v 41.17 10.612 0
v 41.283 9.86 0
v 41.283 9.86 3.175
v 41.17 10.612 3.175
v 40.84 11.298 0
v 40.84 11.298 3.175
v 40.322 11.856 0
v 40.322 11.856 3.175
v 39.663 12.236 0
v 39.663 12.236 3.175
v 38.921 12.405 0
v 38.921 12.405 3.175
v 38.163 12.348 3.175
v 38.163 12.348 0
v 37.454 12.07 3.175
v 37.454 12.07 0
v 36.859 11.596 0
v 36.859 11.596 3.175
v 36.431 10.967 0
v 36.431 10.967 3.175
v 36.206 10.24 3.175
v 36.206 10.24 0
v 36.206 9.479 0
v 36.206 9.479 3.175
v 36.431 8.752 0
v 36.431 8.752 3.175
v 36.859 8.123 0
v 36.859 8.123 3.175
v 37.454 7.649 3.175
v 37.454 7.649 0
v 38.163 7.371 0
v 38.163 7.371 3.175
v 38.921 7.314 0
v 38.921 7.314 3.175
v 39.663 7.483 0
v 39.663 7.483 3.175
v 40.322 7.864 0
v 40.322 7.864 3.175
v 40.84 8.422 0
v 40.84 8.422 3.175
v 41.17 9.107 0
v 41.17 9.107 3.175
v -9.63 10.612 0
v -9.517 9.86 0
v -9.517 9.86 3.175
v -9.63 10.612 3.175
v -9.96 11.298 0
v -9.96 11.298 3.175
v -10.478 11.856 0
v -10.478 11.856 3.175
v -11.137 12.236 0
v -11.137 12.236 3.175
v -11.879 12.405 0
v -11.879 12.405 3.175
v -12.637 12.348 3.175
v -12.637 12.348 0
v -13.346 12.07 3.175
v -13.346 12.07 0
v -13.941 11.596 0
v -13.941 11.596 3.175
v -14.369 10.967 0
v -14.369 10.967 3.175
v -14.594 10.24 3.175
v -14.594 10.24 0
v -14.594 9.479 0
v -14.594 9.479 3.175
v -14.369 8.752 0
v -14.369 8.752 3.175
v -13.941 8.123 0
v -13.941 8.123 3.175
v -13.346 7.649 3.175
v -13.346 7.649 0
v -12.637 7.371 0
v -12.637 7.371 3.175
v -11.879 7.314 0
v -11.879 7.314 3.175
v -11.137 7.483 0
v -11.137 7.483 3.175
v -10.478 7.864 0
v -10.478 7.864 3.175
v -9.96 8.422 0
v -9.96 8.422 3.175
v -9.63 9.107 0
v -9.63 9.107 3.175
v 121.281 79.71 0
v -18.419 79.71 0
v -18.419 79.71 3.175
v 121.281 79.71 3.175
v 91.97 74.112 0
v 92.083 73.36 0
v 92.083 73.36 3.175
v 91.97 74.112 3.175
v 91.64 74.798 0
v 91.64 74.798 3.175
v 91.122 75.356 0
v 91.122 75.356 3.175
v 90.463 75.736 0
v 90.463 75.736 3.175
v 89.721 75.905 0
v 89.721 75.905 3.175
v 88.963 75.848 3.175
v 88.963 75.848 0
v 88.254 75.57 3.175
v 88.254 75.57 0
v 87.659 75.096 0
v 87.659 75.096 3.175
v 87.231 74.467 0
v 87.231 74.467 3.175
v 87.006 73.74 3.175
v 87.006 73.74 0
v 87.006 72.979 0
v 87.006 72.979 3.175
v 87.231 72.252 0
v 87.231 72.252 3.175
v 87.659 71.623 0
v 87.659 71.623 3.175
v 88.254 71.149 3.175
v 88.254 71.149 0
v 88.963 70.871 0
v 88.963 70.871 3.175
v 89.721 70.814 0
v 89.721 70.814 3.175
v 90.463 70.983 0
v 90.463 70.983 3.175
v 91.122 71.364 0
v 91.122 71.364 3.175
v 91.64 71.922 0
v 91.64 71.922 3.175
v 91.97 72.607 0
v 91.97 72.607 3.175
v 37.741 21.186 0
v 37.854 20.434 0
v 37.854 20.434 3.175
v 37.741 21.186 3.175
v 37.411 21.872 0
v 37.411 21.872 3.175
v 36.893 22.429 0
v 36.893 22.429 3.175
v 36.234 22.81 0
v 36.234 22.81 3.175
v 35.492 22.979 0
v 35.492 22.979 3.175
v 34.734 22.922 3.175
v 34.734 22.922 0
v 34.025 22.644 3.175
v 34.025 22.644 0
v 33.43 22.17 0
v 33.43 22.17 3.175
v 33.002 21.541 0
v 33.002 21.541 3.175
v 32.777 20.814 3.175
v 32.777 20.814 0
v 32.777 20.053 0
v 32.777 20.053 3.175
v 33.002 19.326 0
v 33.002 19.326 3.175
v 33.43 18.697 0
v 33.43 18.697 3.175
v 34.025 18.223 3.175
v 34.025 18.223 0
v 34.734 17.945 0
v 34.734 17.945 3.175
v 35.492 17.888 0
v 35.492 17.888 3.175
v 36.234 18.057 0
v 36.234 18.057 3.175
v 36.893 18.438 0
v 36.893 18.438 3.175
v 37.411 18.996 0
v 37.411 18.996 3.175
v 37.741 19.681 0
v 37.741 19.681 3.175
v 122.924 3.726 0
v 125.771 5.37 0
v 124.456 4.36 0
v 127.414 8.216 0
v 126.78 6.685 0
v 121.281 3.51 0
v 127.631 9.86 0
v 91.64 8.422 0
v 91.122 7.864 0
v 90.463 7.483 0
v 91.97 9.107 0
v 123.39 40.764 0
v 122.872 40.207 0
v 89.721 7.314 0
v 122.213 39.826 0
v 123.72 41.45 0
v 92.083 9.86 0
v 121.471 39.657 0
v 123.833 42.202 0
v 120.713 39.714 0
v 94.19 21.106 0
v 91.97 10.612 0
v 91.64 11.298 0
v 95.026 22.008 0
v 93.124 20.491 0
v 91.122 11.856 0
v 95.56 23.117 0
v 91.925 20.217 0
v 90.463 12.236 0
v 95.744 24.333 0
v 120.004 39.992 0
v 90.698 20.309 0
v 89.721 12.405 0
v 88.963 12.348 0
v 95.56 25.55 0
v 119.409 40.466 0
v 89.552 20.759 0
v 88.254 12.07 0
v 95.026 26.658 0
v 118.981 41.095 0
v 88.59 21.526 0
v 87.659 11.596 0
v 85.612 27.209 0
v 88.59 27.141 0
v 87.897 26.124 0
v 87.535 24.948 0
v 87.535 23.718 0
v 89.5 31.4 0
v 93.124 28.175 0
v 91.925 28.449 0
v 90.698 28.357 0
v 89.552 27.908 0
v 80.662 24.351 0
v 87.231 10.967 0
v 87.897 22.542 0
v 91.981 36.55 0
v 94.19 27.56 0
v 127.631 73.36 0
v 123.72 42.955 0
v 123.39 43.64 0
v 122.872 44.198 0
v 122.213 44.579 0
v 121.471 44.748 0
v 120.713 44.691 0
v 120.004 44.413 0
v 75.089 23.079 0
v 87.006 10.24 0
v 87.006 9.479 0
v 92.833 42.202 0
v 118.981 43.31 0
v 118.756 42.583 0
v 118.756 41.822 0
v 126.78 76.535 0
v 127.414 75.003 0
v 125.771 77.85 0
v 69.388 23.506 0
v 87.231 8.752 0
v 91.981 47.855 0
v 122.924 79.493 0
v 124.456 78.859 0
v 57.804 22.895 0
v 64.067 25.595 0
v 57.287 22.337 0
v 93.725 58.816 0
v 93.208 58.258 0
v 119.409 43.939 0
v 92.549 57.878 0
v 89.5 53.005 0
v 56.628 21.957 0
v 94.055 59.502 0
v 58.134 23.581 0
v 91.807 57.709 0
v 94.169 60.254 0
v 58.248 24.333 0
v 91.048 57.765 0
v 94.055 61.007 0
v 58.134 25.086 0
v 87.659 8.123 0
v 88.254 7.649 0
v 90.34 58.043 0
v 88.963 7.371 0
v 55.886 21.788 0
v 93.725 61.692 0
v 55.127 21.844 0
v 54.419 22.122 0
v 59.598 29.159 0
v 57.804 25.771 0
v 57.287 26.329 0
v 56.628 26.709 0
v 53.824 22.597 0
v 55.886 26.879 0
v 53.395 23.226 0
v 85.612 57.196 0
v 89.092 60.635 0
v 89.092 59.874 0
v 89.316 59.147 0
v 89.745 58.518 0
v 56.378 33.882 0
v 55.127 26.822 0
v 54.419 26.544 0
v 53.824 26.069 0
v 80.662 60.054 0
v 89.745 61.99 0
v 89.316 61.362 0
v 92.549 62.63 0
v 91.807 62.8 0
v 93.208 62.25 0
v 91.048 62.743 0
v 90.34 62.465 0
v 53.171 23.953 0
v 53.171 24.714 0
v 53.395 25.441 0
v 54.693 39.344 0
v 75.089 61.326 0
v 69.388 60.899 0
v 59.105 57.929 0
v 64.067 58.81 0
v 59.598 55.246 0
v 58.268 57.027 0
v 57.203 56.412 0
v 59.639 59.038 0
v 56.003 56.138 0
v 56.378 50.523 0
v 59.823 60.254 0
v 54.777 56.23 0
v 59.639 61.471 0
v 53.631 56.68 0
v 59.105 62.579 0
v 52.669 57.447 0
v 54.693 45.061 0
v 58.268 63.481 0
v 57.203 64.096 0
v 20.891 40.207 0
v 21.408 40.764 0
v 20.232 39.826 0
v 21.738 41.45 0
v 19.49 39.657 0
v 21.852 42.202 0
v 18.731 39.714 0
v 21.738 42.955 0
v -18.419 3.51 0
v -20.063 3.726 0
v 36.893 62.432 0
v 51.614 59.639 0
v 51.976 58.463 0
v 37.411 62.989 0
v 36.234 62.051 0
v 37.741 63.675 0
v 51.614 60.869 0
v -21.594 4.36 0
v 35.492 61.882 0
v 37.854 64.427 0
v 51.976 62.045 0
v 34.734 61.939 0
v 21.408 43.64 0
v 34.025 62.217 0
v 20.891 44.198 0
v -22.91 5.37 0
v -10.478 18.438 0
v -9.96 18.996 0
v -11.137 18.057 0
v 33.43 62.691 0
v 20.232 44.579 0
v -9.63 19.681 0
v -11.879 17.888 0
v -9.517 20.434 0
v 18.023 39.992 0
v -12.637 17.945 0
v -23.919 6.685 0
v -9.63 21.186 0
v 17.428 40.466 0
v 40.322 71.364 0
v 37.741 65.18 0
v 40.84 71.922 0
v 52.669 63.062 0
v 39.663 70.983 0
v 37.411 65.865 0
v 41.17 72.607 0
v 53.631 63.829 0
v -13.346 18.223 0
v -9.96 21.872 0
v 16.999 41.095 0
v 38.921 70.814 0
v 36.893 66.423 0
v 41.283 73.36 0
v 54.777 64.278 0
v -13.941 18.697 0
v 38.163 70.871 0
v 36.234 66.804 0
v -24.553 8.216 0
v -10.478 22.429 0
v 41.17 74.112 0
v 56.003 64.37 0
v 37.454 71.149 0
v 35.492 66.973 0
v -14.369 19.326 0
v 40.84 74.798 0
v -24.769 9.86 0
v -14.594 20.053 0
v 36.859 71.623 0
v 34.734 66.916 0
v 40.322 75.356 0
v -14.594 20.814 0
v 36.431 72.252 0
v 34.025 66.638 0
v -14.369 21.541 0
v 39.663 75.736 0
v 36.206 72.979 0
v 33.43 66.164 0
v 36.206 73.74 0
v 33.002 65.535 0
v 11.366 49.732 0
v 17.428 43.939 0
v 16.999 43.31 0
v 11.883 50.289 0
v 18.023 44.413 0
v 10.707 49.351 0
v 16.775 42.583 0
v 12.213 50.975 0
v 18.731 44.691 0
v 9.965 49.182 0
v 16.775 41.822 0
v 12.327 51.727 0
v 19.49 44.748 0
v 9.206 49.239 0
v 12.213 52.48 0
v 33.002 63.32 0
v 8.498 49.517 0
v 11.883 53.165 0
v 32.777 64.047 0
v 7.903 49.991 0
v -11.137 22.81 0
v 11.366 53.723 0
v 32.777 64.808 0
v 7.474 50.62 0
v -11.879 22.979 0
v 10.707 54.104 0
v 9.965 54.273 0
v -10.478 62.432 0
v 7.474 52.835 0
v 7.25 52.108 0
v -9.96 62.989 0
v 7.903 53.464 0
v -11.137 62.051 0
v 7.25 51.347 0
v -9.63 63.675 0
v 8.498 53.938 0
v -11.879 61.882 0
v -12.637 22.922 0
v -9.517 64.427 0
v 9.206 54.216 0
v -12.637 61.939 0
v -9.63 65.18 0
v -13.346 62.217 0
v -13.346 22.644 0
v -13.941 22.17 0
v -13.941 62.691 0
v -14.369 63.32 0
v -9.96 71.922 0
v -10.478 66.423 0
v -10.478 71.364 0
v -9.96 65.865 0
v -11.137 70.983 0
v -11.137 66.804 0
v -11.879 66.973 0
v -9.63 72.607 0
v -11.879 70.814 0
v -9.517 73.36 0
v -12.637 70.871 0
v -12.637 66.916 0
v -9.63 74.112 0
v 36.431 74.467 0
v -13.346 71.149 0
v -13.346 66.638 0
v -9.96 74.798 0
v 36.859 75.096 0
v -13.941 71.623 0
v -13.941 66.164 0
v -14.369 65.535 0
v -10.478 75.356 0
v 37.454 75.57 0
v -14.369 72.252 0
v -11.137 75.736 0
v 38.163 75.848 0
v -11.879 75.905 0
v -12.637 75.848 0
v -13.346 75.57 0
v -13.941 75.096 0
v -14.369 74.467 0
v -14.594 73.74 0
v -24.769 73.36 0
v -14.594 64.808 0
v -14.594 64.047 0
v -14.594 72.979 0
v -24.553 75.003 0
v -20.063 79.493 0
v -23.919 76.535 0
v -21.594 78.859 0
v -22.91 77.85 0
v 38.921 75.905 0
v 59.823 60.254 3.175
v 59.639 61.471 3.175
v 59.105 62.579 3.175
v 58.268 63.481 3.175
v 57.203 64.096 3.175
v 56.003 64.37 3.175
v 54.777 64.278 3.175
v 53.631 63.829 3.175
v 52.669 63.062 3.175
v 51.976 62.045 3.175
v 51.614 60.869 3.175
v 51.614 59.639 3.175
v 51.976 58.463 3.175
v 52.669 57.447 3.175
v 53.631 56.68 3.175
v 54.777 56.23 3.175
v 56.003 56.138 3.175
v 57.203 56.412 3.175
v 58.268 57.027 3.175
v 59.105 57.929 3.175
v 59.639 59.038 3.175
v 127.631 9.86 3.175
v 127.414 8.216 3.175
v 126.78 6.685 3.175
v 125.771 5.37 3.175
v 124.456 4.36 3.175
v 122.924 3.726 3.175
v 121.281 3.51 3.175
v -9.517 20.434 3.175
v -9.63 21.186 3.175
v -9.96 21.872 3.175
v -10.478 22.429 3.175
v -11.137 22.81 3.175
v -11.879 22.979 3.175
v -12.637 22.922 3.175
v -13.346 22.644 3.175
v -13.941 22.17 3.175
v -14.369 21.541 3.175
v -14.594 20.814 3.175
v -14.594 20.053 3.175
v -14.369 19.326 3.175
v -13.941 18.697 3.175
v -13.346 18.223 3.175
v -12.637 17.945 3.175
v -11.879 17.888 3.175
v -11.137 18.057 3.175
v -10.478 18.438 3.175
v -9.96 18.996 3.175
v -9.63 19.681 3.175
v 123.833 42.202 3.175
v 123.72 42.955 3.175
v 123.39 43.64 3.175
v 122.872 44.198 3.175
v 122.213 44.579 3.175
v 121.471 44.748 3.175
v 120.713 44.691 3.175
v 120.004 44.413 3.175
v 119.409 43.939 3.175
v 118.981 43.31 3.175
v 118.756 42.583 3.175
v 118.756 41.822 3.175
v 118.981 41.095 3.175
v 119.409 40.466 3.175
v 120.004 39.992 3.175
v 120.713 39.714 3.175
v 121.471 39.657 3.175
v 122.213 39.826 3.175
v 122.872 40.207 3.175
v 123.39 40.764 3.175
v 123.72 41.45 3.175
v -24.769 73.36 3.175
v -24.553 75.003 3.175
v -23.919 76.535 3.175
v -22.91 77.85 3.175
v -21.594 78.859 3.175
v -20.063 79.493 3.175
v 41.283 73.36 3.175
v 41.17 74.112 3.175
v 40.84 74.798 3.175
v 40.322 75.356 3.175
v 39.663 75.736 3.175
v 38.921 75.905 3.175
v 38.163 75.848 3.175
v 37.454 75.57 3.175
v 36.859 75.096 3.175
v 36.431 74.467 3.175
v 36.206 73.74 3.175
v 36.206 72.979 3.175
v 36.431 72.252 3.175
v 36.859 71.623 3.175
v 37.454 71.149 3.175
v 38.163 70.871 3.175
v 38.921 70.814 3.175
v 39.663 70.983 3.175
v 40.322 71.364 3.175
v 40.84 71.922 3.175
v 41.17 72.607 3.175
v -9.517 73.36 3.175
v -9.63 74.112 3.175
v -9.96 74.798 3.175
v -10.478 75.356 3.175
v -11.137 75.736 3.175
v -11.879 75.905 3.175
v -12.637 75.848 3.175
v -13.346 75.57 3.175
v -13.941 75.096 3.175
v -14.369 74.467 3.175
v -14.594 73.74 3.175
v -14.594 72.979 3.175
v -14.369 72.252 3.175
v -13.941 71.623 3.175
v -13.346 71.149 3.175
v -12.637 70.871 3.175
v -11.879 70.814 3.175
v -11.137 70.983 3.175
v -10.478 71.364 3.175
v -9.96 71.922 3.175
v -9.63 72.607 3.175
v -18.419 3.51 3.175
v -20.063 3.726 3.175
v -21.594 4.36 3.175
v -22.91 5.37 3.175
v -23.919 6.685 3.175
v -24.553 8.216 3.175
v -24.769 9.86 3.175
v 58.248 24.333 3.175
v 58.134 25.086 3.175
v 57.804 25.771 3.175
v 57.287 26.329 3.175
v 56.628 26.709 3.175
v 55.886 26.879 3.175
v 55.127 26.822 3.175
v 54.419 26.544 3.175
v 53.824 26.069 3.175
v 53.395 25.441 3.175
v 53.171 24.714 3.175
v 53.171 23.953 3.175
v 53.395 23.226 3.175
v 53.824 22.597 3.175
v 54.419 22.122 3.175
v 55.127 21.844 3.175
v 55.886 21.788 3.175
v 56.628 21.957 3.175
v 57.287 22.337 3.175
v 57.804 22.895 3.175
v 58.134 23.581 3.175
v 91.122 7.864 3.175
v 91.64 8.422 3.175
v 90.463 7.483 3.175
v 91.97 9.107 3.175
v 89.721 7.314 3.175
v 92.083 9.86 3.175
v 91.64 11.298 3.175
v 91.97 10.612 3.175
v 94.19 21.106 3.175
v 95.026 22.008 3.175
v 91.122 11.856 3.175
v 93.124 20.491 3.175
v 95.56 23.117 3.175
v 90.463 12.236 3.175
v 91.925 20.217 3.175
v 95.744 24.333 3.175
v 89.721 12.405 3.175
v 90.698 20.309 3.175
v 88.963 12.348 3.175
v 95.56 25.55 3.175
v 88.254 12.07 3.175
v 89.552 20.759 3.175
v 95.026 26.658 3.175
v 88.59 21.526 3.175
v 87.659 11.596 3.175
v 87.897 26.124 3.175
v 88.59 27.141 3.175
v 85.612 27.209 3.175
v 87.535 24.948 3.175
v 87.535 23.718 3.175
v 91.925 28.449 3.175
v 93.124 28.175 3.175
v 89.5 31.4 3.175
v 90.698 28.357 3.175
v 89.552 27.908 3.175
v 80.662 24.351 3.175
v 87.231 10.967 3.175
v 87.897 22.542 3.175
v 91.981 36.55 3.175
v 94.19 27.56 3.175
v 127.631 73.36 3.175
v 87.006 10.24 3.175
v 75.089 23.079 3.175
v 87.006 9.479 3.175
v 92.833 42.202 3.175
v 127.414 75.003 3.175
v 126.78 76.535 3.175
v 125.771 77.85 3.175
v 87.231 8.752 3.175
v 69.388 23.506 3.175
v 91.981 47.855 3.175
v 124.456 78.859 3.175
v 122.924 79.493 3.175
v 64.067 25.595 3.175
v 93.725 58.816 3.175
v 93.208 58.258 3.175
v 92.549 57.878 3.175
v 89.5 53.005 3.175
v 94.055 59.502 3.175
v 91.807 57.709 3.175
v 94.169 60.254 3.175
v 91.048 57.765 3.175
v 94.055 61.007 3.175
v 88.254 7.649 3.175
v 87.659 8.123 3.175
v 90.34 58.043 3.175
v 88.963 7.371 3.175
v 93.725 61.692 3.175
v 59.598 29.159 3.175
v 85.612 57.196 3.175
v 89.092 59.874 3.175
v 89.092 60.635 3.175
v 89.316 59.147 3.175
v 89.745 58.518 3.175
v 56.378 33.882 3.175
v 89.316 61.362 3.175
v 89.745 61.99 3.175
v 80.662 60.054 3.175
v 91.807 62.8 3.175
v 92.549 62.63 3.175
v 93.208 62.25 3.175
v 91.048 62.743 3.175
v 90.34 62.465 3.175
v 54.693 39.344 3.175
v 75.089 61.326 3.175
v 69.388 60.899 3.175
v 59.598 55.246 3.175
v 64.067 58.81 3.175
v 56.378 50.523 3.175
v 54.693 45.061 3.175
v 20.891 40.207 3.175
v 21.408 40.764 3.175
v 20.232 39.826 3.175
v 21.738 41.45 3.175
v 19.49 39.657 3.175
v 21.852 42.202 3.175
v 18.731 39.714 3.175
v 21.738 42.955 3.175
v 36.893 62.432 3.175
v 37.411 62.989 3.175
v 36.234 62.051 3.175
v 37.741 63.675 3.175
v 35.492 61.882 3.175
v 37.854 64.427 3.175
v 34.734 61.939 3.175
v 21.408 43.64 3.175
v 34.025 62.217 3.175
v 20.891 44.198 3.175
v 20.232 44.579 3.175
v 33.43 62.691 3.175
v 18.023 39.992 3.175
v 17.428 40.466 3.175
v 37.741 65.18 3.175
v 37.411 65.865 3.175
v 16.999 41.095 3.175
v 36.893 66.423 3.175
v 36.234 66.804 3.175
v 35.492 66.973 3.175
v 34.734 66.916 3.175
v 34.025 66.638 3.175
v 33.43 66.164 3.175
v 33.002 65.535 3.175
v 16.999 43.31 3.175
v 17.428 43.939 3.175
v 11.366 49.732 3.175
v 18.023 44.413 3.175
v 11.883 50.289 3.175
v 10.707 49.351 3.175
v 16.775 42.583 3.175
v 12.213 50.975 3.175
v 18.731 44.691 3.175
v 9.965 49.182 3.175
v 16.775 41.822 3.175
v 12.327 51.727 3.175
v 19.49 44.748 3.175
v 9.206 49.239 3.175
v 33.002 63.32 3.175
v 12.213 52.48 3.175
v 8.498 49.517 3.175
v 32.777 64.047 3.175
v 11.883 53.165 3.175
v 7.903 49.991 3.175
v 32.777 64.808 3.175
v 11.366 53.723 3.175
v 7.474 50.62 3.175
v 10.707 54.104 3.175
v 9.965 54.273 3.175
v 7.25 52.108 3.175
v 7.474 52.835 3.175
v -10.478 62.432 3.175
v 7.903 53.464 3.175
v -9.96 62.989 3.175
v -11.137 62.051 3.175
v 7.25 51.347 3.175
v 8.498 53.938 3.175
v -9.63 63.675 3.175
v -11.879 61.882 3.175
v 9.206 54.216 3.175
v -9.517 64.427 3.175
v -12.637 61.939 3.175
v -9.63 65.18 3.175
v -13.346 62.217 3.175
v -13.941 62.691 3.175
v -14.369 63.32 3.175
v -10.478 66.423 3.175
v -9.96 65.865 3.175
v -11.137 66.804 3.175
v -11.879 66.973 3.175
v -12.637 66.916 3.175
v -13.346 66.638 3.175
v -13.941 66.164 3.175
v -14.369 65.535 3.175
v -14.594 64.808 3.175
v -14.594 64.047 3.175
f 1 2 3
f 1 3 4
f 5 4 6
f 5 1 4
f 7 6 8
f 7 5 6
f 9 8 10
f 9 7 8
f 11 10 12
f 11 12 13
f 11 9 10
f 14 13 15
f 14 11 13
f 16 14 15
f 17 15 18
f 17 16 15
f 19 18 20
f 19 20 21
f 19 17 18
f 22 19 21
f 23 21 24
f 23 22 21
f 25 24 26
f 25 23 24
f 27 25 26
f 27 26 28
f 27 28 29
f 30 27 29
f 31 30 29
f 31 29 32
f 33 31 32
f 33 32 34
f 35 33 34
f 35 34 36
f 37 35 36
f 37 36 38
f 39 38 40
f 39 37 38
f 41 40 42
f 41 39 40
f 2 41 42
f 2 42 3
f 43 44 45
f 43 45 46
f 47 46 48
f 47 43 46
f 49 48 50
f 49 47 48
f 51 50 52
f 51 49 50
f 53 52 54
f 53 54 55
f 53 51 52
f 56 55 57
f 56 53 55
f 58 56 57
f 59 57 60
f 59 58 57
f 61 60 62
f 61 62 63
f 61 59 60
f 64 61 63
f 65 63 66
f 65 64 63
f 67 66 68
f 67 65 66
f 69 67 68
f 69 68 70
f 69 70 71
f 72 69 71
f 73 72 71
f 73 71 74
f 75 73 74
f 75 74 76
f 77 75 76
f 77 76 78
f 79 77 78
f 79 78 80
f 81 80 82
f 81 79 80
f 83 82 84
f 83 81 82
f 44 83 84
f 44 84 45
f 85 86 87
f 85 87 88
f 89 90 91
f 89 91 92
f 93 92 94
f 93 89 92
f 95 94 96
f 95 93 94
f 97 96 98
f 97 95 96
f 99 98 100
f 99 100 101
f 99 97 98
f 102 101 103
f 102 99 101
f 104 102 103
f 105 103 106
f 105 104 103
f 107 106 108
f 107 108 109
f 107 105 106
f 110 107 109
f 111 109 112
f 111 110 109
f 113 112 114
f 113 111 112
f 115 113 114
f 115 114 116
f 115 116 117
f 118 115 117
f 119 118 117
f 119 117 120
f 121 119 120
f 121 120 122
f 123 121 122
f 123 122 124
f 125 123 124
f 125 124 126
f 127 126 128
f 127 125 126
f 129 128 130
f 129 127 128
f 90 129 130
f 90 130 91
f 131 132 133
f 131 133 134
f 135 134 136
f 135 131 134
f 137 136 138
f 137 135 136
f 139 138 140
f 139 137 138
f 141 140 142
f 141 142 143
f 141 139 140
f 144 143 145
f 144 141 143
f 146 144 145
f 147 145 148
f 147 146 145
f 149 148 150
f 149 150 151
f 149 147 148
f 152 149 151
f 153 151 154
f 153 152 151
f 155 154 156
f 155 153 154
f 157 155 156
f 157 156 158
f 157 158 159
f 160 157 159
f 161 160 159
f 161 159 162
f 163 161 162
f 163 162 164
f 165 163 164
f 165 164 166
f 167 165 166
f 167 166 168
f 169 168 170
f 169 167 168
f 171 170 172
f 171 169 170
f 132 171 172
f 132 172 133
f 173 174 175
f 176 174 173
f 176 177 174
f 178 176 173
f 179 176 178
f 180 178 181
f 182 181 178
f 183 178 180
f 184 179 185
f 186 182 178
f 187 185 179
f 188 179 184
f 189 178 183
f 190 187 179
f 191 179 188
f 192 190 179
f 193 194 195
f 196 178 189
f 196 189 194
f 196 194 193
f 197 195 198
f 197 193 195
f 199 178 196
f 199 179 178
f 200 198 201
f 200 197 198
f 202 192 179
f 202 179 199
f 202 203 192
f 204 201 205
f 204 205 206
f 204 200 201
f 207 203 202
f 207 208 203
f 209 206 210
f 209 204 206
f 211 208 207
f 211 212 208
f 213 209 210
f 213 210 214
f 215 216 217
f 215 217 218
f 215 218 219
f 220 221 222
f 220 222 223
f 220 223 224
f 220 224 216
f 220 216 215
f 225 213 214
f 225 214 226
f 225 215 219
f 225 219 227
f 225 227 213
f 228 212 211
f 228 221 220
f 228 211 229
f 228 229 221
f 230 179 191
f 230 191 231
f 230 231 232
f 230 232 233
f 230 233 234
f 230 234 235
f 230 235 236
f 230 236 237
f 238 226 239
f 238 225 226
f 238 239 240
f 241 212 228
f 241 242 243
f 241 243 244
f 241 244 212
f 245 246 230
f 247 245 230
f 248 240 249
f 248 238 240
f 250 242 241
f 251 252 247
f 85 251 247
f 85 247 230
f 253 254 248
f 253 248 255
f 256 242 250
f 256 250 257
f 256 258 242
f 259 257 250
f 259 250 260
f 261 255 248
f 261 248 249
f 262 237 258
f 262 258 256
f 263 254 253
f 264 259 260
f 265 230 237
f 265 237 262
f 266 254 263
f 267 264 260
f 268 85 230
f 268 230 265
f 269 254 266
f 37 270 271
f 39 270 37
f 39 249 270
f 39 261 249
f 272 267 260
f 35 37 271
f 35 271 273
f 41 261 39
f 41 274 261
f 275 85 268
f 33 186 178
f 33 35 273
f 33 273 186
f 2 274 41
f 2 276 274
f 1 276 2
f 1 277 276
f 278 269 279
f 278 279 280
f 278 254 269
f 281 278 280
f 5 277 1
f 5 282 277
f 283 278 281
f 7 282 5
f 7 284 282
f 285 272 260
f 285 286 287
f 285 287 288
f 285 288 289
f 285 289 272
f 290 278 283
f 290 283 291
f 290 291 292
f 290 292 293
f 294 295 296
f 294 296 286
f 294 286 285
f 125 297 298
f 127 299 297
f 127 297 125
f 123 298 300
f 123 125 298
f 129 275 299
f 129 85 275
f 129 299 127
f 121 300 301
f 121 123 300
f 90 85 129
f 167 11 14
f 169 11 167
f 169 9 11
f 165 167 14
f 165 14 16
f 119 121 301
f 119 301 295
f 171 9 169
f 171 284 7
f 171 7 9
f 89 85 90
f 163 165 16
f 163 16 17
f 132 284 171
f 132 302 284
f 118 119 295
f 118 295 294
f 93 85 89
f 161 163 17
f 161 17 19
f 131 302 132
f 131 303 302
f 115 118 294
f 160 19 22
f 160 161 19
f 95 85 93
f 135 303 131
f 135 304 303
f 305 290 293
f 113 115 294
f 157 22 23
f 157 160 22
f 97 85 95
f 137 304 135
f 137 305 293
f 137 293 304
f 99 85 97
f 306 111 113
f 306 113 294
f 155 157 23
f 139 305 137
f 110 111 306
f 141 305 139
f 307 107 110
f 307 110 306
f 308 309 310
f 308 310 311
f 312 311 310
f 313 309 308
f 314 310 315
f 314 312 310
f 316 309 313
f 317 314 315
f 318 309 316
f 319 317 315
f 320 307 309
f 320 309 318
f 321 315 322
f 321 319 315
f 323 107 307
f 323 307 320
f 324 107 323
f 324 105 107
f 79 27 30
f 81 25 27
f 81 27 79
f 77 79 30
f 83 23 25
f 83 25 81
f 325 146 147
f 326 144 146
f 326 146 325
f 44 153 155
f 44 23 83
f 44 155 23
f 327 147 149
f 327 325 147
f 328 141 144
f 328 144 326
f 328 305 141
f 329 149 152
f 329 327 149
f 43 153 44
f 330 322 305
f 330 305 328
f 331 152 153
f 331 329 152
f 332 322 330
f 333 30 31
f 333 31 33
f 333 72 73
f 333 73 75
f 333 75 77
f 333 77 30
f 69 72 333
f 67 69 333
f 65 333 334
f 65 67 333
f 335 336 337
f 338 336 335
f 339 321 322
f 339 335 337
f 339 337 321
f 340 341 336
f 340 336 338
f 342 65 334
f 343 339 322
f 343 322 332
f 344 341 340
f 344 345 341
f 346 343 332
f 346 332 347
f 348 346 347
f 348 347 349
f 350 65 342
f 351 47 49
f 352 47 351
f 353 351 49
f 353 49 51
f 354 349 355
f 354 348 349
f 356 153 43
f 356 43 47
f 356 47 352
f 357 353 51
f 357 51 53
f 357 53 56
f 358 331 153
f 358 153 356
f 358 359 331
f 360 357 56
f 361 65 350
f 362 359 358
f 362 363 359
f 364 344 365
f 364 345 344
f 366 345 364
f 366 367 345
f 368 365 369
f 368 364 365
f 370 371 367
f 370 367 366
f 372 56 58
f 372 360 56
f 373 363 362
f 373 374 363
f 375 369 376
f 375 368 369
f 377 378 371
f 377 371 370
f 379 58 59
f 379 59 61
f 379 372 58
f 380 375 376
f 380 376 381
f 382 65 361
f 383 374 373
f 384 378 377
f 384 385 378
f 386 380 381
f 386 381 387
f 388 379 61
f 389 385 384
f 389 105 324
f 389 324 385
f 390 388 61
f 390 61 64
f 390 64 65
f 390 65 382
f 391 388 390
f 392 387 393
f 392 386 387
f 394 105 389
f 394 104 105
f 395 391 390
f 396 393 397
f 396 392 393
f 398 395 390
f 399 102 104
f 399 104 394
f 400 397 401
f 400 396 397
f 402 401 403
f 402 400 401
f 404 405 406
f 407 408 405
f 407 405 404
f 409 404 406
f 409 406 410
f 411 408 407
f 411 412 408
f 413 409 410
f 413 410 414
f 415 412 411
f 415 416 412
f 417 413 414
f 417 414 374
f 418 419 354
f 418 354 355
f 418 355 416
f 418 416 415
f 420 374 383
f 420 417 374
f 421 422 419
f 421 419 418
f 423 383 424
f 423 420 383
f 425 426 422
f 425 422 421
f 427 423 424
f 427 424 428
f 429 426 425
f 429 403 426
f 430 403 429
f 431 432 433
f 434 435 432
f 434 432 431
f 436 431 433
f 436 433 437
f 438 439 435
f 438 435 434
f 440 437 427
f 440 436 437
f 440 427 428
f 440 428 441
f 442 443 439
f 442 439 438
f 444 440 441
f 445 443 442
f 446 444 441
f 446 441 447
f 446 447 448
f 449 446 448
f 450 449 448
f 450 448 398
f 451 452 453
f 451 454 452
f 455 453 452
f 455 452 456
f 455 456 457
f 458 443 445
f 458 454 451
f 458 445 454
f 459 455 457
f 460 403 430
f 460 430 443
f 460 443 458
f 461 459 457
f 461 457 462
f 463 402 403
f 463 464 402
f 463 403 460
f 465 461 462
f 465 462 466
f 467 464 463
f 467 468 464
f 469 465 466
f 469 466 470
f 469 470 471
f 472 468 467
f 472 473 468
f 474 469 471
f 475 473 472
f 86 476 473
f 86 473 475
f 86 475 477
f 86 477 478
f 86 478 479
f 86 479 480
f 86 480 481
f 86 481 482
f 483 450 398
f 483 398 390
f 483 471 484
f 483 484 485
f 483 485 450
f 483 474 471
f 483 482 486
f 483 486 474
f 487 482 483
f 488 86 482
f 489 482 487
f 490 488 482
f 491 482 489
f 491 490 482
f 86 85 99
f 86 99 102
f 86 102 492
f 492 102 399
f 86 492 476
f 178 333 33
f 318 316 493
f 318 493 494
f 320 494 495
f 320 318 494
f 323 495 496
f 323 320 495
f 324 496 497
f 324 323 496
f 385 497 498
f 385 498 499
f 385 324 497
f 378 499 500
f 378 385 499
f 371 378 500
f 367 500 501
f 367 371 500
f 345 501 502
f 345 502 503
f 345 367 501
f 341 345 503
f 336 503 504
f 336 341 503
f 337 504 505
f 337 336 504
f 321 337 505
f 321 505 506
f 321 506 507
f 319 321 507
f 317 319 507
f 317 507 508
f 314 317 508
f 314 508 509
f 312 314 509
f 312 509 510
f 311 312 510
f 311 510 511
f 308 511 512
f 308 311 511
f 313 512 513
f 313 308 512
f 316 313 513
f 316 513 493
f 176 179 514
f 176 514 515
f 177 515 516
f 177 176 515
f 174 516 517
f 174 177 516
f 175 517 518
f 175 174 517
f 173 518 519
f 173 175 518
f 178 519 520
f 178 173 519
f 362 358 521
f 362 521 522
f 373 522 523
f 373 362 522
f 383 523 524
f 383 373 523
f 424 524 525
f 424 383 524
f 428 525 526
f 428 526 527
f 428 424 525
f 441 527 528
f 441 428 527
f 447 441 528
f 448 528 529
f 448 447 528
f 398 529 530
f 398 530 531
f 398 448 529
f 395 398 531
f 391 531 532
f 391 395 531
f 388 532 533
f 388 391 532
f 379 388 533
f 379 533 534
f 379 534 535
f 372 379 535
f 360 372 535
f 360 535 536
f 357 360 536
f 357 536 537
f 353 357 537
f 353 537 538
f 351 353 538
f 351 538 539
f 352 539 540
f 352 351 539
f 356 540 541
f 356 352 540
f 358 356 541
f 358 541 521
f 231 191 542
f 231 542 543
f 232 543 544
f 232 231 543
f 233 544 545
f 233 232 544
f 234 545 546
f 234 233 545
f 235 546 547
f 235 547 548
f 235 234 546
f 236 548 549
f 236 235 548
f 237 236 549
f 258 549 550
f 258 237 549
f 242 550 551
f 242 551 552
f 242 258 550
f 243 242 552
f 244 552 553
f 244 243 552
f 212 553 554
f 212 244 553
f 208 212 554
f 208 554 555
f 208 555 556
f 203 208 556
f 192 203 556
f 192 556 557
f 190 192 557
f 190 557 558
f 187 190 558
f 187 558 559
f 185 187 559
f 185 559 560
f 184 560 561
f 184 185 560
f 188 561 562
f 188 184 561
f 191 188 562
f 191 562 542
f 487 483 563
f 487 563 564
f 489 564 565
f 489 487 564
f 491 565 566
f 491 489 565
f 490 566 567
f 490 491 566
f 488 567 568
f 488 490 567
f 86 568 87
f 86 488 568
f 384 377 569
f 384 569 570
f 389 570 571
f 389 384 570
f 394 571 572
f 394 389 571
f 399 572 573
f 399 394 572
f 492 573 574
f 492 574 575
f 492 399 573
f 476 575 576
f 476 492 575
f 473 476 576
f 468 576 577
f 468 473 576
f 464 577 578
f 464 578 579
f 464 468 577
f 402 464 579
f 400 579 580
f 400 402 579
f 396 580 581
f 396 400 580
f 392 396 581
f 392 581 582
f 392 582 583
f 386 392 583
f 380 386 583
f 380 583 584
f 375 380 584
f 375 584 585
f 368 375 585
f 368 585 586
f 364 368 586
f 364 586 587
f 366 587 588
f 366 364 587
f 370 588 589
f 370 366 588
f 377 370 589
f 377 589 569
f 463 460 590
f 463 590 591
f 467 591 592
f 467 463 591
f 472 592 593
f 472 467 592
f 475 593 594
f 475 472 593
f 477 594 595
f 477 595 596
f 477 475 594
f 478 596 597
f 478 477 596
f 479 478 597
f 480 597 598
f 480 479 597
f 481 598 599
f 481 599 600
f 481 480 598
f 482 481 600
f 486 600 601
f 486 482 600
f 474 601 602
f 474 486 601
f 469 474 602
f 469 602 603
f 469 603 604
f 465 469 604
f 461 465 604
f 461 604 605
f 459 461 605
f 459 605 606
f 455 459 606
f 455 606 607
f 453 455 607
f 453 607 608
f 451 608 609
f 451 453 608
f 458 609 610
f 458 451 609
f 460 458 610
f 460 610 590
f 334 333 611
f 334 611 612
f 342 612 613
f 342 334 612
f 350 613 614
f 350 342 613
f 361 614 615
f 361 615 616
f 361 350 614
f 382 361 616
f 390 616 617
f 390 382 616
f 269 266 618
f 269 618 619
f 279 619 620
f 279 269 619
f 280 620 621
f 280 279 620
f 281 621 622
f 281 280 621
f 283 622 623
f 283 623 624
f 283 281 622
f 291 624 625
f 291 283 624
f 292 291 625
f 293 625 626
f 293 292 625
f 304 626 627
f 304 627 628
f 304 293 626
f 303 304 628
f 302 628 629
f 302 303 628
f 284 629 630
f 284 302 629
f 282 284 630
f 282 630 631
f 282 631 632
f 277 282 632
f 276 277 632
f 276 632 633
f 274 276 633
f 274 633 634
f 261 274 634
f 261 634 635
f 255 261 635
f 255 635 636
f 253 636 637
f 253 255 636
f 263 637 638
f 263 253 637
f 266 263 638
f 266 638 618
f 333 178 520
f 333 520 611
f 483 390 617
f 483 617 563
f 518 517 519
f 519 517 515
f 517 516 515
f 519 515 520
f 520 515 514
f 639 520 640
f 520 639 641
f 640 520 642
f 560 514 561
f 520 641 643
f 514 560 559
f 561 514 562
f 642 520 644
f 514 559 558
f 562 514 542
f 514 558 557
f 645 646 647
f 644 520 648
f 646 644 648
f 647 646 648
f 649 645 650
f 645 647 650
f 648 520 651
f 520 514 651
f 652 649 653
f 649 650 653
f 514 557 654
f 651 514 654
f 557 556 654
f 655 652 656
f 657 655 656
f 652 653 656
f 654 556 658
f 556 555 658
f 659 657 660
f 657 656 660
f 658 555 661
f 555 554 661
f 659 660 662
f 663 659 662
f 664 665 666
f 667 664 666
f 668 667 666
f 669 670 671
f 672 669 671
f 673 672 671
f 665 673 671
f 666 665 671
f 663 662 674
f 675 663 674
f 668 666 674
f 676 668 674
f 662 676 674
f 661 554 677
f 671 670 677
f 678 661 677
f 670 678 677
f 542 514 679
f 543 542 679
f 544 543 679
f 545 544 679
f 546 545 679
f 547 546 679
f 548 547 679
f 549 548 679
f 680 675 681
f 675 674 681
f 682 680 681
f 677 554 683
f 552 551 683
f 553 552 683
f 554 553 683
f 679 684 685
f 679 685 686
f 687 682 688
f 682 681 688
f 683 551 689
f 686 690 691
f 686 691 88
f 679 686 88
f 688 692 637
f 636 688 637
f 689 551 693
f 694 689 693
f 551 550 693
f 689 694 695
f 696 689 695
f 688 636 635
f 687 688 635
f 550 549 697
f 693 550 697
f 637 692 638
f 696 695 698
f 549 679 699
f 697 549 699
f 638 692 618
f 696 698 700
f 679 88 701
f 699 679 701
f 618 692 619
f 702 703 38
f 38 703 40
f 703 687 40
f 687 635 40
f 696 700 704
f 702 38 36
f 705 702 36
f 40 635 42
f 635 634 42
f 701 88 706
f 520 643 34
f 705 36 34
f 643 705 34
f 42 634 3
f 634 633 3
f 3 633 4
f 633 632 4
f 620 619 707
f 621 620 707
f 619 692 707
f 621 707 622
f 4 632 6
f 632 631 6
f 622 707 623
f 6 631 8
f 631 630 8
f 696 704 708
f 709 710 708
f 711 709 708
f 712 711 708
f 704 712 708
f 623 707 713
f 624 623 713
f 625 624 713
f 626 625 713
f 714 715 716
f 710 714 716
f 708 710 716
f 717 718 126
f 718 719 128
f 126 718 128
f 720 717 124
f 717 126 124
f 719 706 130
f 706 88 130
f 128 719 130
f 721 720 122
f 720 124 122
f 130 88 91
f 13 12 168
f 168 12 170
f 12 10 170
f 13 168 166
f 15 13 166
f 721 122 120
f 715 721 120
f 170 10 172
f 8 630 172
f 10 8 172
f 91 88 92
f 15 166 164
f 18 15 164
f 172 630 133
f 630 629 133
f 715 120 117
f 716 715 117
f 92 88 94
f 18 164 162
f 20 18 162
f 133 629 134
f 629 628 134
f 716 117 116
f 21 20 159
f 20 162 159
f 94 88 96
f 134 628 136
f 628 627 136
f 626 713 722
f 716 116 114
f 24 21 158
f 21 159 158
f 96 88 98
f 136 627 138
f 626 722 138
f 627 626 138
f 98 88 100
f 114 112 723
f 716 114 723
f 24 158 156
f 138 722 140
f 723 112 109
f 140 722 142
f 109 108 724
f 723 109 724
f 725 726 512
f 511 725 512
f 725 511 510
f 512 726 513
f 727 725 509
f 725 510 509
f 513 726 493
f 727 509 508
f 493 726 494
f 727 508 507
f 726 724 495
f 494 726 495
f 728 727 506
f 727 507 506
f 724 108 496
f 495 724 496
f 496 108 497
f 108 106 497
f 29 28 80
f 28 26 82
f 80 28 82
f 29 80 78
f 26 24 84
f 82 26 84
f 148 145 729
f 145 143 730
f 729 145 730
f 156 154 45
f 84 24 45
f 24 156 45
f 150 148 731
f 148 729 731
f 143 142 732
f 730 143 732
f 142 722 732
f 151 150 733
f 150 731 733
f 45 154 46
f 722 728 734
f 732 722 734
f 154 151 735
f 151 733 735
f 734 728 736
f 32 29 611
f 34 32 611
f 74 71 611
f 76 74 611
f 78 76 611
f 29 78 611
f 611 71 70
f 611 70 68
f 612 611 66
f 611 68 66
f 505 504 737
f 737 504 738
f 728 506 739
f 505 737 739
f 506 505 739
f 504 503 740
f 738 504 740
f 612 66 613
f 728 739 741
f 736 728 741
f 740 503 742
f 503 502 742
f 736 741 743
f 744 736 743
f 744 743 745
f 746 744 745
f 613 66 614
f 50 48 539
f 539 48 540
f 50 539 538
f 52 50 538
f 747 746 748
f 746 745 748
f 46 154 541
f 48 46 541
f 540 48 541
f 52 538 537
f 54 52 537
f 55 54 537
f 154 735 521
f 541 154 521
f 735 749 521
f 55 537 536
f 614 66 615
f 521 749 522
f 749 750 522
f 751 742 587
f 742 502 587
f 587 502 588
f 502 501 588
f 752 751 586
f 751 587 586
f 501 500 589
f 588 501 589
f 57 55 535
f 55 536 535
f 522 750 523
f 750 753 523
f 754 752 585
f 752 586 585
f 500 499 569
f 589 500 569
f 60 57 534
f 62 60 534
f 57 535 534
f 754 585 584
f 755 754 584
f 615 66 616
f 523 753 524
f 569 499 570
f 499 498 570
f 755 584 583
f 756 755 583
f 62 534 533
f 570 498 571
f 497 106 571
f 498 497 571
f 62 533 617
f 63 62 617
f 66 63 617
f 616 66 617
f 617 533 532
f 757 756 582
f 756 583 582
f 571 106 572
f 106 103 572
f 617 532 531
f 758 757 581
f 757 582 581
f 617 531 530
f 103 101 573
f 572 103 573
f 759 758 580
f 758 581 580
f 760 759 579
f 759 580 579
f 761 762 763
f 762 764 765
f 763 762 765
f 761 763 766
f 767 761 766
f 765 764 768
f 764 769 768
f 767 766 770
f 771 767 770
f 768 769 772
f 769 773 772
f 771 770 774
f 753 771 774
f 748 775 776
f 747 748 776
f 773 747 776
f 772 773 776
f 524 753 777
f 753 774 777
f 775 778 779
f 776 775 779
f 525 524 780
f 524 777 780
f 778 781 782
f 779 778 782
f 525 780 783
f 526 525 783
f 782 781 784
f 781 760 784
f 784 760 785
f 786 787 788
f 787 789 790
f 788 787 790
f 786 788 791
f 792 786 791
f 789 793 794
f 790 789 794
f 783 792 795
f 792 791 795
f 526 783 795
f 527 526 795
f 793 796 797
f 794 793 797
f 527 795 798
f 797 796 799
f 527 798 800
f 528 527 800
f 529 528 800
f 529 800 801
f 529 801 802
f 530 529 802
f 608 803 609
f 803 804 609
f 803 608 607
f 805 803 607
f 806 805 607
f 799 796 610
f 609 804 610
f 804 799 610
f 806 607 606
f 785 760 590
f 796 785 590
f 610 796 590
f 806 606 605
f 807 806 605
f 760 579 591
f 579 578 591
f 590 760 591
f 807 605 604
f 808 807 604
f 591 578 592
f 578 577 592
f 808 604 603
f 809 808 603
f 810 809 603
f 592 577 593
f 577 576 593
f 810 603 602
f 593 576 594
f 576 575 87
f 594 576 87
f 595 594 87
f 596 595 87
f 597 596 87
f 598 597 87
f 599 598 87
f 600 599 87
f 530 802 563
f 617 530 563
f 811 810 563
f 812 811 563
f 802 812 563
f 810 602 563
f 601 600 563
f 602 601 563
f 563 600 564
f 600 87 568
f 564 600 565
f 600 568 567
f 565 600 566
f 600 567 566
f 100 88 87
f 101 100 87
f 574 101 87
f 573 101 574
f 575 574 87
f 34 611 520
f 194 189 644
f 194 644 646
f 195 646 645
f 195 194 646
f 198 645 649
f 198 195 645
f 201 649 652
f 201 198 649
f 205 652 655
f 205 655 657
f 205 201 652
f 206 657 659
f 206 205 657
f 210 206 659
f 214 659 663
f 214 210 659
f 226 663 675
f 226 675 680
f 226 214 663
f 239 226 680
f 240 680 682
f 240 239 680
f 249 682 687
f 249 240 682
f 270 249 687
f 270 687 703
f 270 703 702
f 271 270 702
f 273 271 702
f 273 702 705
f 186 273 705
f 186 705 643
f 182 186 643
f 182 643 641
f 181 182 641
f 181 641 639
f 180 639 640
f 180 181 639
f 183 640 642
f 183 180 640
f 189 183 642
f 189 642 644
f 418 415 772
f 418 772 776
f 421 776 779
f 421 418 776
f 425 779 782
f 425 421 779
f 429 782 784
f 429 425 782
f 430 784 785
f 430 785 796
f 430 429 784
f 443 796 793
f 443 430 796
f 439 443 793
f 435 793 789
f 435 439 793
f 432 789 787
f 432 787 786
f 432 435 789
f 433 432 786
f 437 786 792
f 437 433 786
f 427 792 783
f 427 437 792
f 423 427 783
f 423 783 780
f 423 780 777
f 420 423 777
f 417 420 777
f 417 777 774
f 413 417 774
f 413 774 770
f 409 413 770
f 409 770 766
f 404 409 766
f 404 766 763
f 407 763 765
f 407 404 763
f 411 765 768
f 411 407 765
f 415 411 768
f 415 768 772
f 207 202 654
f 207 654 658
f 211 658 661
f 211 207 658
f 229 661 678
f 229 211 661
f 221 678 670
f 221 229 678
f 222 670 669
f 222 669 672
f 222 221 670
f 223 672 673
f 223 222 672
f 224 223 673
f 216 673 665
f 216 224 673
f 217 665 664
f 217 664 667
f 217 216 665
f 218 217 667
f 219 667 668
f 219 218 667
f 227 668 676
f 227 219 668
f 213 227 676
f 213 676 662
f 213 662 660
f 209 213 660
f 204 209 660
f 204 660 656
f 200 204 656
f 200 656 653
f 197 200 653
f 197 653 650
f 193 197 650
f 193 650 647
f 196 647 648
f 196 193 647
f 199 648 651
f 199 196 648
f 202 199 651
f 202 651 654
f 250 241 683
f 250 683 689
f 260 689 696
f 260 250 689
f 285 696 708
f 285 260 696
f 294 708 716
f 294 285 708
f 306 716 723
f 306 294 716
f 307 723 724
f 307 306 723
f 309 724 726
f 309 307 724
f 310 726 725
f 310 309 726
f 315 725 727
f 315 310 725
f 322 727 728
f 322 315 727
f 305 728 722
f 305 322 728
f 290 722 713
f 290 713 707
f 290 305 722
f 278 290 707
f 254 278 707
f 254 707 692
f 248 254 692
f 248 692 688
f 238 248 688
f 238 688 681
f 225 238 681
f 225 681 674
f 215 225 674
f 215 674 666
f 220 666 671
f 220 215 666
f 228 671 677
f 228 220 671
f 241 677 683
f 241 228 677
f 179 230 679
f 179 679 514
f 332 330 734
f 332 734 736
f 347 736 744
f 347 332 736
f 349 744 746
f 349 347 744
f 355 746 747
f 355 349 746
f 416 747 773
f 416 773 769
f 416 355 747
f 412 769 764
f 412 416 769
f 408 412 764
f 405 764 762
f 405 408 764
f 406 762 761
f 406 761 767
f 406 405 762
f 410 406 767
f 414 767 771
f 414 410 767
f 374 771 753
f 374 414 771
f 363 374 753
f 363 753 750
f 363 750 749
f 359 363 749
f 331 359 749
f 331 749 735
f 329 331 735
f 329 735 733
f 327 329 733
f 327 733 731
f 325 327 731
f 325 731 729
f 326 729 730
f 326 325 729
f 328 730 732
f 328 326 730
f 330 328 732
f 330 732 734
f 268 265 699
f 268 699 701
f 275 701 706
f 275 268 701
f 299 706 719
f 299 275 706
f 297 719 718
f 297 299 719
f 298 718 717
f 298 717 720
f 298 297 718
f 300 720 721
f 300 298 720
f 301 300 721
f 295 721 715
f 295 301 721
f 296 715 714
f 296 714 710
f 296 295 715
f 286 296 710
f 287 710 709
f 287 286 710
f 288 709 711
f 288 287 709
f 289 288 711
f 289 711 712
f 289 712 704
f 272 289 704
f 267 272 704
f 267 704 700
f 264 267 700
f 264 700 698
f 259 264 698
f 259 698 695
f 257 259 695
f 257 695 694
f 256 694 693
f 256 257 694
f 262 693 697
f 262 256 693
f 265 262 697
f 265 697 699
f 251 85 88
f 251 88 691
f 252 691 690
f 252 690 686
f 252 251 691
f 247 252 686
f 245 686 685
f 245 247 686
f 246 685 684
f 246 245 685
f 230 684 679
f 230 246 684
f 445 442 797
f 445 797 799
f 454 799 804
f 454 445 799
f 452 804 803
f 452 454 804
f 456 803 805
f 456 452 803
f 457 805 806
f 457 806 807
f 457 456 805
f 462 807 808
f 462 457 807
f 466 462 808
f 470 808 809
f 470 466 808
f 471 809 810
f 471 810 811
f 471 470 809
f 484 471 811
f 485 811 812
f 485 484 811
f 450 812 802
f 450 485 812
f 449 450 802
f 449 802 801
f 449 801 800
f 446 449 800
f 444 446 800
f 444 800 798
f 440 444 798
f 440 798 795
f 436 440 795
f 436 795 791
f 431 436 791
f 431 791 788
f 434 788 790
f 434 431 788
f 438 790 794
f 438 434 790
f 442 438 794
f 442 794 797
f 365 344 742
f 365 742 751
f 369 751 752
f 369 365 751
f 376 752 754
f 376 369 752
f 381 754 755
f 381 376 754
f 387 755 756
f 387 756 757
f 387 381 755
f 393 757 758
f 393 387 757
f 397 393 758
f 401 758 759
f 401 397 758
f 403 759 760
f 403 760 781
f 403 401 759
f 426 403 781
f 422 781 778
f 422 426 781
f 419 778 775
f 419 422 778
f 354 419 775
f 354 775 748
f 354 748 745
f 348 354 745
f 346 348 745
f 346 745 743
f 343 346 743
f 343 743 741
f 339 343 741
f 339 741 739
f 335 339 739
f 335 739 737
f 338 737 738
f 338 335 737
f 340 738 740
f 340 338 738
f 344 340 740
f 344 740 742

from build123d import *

# Parameters (mm, degrees)
SKETCH1_R           = 2.5527
SKETCH1_R_2         = 4.1275
SKETCH1_R_3         = 19.177
BOSS_EXTRUDE1_DEPTH = 3.175


with BuildPart() as part:
    # Sketch1 → Boss-Extrude1 (new body)
    with BuildSketch(Plane.XY):
        with BuildLine():
            Line((-24.769458796, 9.859734844), (-24.769458796, 73.359734844))
            ThreePointArc((-24.769458796, 73.359734844), (-22.909586857, 77.849862904), (-18.419458796, 79.709734844))
            Line((-18.419458796, 79.709734844), (121.280541204, 79.709734844))
            ThreePointArc((121.280541204, 79.709734844), (125.770669264, 77.849862904), (127.630541204, 73.359734844))
            Line((127.630541204, 73.359734844), (127.630541204, 9.859734844))
            ThreePointArc((127.630541204, 9.859734844), (125.770669264, 5.369606783), (121.280541204, 3.509734844))
            Line((121.280541204, 3.509734844), (-18.419458796, 3.509734844))
            ThreePointArc((-18.419458796, 3.509734844), (-22.909586857, 5.369606783), (-24.769458796, 9.859734844))
        make_face()
        with Locations((89.530541204, 9.859734844)):
            Circle(SKETCH1_R, mode=Mode.SUBTRACT)
        with Locations((89.530541204, 73.359734844)):
            Circle(SKETCH1_R, mode=Mode.SUBTRACT)
        with Locations((-12.069458796, 73.359734844)):
            Circle(SKETCH1_R, mode=Mode.SUBTRACT)
        with Locations((-12.069458796, 64.427395008)):
            Circle(SKETCH1_R, mode=Mode.SUBTRACT)
        with Locations((38.730541204, 73.359734844)):
            Circle(SKETCH1_R, mode=Mode.SUBTRACT)
        with Locations((35.301541204, 64.427395008)):
            Circle(SKETCH1_R, mode=Mode.SUBTRACT)
        with Locations((9.774192889, 51.727395008)):
            Circle(SKETCH1_R, mode=Mode.SUBTRACT)
        with Locations((19.299192889, 42.202395008)):
            Circle(SKETCH1_R, mode=Mode.SUBTRACT)
        with Locations((-12.069458796, 20.433674276)):
            Circle(SKETCH1_R, mode=Mode.SUBTRACT)
        with Locations((35.301541204, 20.433674276)):
            Circle(SKETCH1_R, mode=Mode.SUBTRACT)
        with Locations((38.730541204, 9.859734844)):
            Circle(SKETCH1_R, mode=Mode.SUBTRACT)
        with Locations((55.695028962, 24.33315969)):
            Circle(SKETCH1_R, mode=Mode.SUBTRACT)
        with Locations((55.695028962, 60.254184174)):
            Circle(SKETCH1_R_2, mode=Mode.SUBTRACT)
        with Locations((91.616053446, 60.254184174)):
            Circle(SKETCH1_R, mode=Mode.SUBTRACT)
        with Locations((91.616053446, 24.33315969)):
            Circle(SKETCH1_R_2, mode=Mode.SUBTRACT)
        with Locations((73.655541204, 42.202395008)):
            Circle(SKETCH1_R_3, mode=Mode.SUBTRACT)
        with Locations((-12.069458796, 9.859734844)):
            Circle(SKETCH1_R, mode=Mode.SUBTRACT)
        with Locations((121.280541204, 42.202395008)):
            Circle(SKETCH1_R, mode=Mode.SUBTRACT)
    extrude(amount=BOSS_EXTRUDE1_DEPTH)


solid = part.part
